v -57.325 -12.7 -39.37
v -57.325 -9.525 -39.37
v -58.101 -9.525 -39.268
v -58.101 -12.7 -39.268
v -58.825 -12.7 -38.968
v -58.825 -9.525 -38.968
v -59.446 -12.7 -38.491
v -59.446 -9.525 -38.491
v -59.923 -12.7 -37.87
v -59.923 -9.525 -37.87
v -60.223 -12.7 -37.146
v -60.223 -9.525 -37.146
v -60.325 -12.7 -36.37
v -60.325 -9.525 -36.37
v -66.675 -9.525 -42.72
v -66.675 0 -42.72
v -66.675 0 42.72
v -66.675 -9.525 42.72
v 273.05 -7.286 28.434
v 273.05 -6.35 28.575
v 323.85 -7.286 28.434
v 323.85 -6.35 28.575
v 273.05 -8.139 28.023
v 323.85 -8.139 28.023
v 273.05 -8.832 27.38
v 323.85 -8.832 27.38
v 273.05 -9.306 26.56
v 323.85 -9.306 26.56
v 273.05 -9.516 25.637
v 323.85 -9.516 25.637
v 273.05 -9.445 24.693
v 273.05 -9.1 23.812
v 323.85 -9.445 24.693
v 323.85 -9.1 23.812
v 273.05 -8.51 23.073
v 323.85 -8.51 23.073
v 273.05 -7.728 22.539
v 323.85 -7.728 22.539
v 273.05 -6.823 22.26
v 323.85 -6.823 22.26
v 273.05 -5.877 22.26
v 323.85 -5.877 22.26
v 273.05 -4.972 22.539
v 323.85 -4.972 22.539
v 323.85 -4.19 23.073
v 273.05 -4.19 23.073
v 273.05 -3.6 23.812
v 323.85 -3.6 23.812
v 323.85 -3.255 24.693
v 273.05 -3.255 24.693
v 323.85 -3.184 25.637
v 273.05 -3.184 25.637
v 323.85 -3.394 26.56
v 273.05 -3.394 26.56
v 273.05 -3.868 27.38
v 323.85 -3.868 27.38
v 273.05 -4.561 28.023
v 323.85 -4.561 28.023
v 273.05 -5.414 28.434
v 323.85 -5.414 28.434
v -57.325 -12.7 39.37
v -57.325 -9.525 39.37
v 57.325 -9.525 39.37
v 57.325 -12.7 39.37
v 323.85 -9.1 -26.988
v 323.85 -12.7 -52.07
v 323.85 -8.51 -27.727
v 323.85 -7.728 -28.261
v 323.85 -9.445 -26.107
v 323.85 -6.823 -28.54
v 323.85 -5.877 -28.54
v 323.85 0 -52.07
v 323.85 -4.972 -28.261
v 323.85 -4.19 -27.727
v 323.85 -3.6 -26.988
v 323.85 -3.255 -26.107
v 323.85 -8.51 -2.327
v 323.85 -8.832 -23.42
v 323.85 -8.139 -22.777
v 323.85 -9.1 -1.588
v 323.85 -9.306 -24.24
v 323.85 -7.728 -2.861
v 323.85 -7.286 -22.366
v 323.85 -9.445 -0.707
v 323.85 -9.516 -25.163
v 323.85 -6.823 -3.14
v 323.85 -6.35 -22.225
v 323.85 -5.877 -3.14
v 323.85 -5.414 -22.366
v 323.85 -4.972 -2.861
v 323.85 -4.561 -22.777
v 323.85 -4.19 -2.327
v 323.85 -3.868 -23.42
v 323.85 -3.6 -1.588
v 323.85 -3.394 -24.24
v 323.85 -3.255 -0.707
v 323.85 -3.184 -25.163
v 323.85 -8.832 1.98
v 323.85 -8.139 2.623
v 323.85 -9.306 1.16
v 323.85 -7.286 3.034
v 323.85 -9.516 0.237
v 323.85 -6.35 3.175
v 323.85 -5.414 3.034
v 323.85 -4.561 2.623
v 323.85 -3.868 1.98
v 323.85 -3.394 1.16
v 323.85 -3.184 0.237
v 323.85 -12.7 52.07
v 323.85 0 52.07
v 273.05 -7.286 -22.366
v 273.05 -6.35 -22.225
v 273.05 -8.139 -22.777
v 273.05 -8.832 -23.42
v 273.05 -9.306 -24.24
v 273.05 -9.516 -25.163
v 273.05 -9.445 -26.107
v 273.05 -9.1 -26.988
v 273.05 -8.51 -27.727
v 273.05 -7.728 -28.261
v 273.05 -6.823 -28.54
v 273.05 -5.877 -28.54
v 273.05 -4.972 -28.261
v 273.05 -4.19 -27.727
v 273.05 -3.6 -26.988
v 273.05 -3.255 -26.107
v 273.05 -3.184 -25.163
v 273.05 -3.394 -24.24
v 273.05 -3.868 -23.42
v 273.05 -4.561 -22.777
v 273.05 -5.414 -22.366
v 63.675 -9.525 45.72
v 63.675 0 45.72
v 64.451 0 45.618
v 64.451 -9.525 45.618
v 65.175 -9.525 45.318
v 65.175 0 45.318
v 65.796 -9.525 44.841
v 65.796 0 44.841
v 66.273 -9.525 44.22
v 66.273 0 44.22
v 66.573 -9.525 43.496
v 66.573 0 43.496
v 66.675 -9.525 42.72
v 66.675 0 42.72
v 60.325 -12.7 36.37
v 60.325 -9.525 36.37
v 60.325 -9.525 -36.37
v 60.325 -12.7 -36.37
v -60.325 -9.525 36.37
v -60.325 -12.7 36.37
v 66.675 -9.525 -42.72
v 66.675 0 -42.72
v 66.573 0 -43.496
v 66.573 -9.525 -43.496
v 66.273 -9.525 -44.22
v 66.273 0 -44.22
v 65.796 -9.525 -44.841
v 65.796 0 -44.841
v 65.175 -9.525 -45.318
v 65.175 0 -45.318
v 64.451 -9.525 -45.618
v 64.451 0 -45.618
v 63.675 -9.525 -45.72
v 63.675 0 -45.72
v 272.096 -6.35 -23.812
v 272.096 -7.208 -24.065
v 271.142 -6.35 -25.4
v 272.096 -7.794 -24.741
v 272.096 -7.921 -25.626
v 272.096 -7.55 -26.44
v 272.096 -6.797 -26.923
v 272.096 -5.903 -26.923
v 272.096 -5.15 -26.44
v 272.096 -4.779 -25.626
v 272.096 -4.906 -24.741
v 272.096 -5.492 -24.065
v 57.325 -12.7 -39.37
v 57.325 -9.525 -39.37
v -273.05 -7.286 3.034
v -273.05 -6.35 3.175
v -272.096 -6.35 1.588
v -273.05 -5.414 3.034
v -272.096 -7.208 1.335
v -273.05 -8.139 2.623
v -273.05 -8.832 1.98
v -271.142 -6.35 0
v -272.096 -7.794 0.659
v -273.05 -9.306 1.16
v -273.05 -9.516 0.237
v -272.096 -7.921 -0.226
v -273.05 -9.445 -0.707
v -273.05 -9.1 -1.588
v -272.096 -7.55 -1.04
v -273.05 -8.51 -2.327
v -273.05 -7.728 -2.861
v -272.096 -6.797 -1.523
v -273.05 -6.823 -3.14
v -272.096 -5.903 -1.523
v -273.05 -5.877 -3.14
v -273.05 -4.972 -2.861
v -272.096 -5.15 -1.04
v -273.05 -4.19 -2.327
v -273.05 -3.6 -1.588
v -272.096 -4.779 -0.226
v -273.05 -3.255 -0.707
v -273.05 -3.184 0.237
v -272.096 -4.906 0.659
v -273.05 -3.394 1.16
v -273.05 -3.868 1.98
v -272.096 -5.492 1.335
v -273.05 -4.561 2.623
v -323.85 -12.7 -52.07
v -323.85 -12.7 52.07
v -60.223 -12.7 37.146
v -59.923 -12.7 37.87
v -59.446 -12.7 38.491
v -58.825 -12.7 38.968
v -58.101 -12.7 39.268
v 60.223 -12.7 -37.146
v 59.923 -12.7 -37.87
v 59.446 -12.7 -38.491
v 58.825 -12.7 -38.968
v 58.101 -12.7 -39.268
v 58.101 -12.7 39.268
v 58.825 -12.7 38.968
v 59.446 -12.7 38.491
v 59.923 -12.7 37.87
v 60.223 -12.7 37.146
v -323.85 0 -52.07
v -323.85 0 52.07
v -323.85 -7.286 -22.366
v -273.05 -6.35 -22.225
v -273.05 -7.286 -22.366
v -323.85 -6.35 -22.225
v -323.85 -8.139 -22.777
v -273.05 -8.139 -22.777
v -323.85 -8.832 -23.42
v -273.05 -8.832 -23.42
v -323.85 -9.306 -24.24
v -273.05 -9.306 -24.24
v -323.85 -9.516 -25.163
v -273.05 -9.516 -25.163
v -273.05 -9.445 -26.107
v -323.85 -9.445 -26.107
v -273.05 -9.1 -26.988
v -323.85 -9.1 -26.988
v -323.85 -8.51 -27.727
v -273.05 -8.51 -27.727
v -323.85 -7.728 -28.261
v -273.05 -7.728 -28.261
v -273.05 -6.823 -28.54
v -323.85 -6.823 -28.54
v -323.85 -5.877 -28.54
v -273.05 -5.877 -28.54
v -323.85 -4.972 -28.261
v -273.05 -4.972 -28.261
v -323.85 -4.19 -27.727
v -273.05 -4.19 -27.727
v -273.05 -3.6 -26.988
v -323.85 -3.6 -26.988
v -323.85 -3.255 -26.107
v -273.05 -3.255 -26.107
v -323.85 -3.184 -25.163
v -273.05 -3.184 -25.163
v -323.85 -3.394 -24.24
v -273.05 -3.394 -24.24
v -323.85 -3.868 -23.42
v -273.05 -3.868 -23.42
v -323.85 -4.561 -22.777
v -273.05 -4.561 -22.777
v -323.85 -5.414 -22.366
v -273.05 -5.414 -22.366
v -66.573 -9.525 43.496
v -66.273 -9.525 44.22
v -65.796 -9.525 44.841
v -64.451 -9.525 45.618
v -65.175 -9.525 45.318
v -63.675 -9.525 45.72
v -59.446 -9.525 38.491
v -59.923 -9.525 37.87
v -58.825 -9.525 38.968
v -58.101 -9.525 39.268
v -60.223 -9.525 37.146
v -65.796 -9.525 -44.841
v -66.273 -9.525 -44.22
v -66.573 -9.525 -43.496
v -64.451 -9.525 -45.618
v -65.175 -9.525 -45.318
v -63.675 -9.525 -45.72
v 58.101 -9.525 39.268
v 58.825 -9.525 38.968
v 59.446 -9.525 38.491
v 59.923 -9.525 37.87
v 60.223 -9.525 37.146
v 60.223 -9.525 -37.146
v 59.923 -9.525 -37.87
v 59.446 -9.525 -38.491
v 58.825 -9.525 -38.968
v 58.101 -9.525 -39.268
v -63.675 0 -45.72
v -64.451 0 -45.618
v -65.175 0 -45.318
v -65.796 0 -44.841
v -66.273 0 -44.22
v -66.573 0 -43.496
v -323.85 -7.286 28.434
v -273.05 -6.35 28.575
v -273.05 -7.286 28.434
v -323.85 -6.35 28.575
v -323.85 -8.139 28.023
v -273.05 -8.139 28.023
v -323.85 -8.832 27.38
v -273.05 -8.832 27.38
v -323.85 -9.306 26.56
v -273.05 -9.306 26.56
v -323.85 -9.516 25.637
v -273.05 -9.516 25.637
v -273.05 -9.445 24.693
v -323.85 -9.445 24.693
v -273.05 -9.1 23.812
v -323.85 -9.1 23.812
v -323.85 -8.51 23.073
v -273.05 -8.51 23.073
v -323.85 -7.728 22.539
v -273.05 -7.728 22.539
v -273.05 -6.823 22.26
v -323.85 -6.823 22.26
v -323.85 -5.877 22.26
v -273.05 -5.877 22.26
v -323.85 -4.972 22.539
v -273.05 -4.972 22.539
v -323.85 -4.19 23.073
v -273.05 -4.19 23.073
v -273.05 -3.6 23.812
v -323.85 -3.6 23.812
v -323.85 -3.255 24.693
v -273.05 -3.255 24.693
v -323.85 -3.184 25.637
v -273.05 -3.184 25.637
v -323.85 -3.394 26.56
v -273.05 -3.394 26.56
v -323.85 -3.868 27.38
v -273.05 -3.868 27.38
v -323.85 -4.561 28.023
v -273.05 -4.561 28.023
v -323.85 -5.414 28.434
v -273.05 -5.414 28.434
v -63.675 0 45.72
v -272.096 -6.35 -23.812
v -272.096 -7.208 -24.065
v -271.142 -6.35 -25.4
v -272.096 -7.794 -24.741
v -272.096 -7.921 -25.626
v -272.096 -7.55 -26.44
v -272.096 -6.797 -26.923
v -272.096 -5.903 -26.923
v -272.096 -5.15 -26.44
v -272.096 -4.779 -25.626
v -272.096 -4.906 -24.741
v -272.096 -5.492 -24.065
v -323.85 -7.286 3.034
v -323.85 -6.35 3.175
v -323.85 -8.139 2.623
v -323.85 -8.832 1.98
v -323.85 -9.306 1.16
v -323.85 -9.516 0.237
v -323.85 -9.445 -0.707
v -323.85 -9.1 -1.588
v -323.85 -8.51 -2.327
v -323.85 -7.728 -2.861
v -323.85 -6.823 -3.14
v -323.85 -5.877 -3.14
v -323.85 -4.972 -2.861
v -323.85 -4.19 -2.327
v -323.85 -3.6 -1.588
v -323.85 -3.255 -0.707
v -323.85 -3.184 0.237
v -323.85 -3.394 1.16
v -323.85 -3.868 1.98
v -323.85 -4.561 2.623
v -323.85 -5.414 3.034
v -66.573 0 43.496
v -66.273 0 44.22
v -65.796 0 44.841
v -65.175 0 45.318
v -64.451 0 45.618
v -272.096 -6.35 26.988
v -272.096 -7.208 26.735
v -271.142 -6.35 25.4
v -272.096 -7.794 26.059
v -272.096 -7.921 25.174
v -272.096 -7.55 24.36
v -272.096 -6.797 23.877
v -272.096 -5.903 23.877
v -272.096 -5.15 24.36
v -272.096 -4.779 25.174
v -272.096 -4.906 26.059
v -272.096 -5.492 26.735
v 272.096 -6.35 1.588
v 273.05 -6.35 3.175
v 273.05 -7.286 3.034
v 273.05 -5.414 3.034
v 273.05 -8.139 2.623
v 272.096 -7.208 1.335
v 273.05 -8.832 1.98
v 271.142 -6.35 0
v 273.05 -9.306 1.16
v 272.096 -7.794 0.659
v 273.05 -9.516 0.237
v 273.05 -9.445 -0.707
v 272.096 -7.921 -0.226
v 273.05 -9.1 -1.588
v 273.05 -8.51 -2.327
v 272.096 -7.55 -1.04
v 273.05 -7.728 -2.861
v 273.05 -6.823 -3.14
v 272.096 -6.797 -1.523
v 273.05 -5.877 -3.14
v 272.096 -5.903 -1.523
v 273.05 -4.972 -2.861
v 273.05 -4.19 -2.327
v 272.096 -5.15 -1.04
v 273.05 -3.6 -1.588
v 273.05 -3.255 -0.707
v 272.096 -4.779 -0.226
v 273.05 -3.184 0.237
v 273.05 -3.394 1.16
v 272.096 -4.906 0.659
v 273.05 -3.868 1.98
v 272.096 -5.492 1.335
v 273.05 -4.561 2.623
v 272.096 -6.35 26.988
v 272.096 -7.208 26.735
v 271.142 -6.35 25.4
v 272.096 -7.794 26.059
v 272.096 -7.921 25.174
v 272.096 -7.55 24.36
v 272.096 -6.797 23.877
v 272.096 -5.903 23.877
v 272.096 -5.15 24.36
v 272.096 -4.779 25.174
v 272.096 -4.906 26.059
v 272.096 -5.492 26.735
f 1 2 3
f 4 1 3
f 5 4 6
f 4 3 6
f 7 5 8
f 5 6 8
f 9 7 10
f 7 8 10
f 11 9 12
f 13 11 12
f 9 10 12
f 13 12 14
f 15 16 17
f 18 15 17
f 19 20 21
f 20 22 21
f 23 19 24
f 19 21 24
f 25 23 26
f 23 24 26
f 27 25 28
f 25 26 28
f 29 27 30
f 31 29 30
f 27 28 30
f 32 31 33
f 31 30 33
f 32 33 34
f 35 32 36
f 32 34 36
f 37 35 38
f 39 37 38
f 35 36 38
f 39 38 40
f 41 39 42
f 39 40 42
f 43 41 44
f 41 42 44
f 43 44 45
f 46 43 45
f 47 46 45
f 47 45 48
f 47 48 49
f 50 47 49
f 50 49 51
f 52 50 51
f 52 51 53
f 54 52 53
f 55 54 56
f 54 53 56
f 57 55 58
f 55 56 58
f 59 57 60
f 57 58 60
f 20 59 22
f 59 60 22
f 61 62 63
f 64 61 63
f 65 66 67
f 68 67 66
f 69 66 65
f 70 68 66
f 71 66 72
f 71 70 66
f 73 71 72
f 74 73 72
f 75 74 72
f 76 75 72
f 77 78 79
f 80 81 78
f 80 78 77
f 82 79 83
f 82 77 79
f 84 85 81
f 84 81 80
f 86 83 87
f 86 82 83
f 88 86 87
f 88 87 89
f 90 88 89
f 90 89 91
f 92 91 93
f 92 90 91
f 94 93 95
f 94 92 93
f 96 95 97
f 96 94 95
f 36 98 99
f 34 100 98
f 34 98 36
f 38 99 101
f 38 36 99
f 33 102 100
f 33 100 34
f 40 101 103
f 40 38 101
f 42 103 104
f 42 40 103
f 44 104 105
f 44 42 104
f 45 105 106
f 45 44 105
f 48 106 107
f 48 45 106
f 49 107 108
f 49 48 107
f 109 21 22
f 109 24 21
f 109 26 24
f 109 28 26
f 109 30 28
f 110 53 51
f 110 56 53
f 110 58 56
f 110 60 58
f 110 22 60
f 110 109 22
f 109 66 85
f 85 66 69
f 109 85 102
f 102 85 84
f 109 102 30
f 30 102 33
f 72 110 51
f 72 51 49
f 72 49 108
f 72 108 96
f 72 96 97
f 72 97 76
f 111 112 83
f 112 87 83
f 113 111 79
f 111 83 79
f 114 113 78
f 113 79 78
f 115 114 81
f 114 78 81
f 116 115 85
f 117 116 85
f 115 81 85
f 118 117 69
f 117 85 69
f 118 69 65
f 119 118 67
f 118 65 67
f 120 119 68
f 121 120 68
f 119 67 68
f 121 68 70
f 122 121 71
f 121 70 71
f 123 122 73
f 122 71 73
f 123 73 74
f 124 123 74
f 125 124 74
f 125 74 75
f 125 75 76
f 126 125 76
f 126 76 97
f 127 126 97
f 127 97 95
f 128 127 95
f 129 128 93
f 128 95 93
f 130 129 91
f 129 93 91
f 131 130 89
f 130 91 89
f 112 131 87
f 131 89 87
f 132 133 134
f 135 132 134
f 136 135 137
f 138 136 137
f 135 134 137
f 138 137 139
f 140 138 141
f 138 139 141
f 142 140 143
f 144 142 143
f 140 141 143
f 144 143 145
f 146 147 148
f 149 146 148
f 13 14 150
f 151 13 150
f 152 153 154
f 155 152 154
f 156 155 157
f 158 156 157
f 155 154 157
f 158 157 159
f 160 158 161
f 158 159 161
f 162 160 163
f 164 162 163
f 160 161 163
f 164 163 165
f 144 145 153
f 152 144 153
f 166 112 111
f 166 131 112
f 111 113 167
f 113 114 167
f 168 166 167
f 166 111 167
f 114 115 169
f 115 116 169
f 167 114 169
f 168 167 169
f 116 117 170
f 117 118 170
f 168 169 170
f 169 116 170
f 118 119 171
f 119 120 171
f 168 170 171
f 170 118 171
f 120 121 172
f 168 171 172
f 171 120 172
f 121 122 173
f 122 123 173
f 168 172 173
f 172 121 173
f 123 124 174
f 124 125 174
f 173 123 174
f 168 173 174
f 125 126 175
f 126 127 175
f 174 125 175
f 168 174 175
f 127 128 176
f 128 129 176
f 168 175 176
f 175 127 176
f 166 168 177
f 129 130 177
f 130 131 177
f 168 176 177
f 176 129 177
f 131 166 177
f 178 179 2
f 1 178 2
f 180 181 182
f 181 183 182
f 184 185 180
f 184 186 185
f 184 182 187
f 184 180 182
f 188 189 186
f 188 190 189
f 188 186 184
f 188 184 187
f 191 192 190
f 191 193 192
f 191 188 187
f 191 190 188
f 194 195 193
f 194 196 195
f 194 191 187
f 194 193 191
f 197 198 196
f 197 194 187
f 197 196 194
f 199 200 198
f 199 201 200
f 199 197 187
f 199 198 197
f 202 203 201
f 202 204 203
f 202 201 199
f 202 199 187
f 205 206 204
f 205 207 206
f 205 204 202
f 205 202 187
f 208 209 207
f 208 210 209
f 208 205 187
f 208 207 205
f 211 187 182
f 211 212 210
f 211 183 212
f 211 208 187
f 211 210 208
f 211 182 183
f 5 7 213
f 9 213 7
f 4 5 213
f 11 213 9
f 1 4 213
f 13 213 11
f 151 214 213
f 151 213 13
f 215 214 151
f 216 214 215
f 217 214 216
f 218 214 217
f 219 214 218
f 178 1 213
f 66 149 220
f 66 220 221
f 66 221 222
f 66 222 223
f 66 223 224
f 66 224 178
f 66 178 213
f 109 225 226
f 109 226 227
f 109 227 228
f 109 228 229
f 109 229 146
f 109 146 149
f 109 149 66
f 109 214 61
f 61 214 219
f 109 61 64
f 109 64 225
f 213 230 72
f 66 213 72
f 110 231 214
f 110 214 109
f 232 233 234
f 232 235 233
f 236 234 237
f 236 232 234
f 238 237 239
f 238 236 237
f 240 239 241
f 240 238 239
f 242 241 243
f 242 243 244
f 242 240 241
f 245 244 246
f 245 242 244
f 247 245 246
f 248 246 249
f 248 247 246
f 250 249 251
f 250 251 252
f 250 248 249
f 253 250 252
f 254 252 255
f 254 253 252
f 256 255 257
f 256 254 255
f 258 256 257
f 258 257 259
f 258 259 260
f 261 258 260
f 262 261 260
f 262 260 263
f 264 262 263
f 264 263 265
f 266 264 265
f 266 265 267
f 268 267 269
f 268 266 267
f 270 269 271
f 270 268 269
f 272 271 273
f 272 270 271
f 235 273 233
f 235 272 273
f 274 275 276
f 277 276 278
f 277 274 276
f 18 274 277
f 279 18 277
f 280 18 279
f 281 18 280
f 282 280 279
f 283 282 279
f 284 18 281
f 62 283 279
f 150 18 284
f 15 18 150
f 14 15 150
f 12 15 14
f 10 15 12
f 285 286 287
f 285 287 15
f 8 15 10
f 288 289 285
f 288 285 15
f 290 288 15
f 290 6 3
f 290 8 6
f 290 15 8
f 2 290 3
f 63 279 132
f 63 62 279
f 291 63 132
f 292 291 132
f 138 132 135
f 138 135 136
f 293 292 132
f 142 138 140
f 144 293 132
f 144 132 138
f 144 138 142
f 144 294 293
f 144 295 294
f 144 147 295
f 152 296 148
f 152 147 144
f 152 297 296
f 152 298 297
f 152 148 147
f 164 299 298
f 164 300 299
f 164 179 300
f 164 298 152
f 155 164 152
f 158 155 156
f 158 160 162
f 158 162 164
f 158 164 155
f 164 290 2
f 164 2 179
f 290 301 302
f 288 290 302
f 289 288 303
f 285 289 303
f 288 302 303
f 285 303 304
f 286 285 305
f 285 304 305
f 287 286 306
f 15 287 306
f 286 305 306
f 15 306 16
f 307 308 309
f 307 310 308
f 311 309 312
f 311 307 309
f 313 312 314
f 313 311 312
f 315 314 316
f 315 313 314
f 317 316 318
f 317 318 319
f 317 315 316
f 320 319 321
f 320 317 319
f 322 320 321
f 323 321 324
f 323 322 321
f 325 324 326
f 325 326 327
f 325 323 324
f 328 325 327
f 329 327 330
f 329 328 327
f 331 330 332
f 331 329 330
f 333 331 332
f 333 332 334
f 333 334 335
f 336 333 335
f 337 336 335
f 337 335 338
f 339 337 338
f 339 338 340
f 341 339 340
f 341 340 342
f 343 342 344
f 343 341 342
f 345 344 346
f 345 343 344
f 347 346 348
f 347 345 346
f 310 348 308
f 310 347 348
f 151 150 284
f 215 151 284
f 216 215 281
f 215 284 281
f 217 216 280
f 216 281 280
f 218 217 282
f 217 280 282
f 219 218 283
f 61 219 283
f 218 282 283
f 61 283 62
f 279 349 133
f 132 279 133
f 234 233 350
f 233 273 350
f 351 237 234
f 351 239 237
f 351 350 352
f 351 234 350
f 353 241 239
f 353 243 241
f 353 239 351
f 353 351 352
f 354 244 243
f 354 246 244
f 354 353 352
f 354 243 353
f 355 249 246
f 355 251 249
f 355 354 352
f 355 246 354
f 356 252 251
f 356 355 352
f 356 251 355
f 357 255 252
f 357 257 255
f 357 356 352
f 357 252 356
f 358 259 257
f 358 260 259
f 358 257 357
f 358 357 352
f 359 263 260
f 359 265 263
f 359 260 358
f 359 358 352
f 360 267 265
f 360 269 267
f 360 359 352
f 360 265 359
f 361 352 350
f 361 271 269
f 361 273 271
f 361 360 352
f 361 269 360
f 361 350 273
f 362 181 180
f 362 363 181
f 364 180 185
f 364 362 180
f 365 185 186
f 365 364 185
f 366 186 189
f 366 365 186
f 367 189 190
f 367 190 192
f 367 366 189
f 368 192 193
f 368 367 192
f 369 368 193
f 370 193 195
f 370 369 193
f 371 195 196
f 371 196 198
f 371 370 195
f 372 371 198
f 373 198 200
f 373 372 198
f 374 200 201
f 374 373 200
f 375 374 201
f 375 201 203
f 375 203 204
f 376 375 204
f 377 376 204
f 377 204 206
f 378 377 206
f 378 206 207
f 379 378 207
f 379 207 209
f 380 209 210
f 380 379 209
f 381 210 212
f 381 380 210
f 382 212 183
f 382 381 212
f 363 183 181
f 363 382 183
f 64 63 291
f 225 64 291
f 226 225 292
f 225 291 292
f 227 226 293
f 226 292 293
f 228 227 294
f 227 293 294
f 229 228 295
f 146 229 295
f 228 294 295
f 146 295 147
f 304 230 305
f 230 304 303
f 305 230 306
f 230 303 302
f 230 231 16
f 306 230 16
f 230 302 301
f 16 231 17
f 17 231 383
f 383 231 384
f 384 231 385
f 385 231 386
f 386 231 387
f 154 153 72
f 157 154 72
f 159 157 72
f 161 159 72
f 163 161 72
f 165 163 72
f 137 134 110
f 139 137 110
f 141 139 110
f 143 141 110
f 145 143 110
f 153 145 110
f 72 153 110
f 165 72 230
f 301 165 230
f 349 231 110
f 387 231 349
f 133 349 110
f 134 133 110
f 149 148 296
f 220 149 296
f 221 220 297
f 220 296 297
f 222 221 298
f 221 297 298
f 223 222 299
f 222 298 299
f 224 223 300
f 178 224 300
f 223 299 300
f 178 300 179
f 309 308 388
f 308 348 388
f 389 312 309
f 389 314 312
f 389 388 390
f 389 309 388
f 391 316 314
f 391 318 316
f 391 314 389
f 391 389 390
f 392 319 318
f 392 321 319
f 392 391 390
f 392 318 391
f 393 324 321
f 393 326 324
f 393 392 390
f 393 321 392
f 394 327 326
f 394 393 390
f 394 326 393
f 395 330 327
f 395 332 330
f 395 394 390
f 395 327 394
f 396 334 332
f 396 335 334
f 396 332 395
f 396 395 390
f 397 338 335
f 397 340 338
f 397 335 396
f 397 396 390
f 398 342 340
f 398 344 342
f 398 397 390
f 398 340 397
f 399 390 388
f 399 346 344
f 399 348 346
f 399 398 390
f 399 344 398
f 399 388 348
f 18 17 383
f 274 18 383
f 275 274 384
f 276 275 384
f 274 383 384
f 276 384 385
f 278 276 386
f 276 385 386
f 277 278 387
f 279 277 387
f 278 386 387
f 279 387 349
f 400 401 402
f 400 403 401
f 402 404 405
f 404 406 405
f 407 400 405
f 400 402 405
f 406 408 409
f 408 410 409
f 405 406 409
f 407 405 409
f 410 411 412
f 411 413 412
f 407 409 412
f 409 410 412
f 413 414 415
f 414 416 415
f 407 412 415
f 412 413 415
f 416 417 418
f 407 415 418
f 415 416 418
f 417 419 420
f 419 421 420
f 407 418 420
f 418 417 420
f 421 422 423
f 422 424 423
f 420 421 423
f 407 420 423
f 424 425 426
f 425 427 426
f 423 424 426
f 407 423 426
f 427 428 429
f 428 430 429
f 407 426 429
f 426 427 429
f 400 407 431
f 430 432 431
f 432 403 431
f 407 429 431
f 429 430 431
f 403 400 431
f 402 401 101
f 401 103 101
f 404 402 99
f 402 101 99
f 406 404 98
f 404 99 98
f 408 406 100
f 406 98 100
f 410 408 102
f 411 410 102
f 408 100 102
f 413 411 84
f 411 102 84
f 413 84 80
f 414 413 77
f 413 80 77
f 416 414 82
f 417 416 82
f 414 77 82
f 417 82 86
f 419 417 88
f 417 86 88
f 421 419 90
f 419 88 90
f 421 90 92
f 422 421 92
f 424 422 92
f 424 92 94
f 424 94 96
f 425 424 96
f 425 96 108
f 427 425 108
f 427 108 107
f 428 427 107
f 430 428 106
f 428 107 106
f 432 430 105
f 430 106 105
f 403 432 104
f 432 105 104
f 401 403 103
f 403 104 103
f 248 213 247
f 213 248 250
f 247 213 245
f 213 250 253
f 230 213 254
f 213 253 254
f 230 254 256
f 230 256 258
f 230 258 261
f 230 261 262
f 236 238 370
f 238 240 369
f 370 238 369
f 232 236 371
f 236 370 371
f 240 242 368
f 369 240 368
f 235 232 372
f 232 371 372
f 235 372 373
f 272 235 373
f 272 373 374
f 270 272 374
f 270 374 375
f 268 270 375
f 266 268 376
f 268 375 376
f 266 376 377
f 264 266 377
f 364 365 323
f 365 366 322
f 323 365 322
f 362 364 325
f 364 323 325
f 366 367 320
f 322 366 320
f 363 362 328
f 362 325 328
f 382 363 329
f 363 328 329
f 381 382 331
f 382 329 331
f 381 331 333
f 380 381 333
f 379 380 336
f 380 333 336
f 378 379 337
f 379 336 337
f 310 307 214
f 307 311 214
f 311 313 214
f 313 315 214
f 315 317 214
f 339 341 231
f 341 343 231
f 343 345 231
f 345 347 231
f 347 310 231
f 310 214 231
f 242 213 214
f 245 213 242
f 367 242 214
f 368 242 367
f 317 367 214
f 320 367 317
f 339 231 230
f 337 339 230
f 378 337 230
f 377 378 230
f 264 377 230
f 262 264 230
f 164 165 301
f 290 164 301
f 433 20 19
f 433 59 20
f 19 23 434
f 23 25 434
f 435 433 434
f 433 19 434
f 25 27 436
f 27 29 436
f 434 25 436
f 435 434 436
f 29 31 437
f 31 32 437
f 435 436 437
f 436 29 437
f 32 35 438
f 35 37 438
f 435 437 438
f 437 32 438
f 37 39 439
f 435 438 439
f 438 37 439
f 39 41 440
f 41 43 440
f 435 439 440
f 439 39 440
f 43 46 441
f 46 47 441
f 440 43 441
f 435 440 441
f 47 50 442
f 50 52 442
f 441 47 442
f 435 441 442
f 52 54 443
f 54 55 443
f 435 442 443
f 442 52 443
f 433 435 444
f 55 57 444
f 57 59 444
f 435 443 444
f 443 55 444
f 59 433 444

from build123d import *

# Parameters (mm, degrees)
SKETCH2_W                         = 647.7
SKETCH2_H                         = 12.7
BOSS_EXTRUDE1_DEPTH               = 52.07
CUT_EXTRUDE1_DEPTH                = 9.525
F_1_4_20_THREADED_HOLE_AT_2_COUNT = 2
F_1_4_20_THREADED_HOLE_AT_2_PITCH = 25.4
F_1_4_20_THREADED_HOLE_AT_3_COUNT = 2
F_1_4_20_THREADED_HOLE_AT_3_PITCH = 50.8
CUT_EXTRUDE2_DEPTH                = 329.255079778


with BuildPart() as part:
    # Sketch2 → Boss-Extrude1 (new, symmetric)
    with BuildSketch(Plane.XY):
        with Locations((0, -6.35)):
            Rectangle(SKETCH2_W, SKETCH2_H)
    extrude(amount=BOSS_EXTRUDE1_DEPTH, both=True)

    # Sketch3 → Cut-Extrude1 (cut)
    with BuildSketch(Plane(origin=(0, 0, 0), x_dir=(1, 0, 0), z_dir=(0, 1, 0))):
        with BuildLine():
            Line((63.675, 45.72), (-63.675, 45.72))
            ThreePointArc((-63.675, 45.72), (-65.796320344, 44.841320344), (-66.675, 42.72))
            Line((-66.675, 42.72), (-66.675, -42.72))
            ThreePointArc((-66.675, -42.72), (-65.796320344, -44.841320344), (-63.675, -45.72))
            Line((-63.675, -45.72), (63.675, -45.72))
            ThreePointArc((63.675, -45.72), (65.796320344, -44.841320344), (66.675, -42.72))
            Line((66.675, -42.72), (66.675, 42.72))
            ThreePointArc((66.675, 42.72), (65.796320344, 44.841320344), (63.675, 45.72))
        make_face()
    extrude(amount=-CUT_EXTRUDE1_DEPTH, mode=Mode.SUBTRACT)

    # Sketch6 → 1/4"-20 threaded hole (revolve, cut)
    with BuildSketch(Plane(origin=(-323.85, -6.35, -25.4), x_dir=(0, 0, 1), z_dir=(0, 1, 0))):
        Polygon((0, 0), (0, 52.707732465), (3.175, 50.8), (3.175, 0), align=None)
    f_1_4_20_threaded_hole = revolve(axis=Axis((-330.2, -6.35, -25.4), (1, 0, 0)), mode=Mode.SUBTRACT)

    # 1/4"-20 threaded hole at 2: 1/4"-20 threaded hole ×2
    with Locations(*[(0, 0, i * F_1_4_20_THREADED_HOLE_AT_2_PITCH) for i in range(1, F_1_4_20_THREADED_HOLE_AT_2_COUNT)]):
        add(f_1_4_20_threaded_hole, mode=Mode.SUBTRACT)

    # 1/4"-20 threaded hole at 3: 1/4"-20 threaded hole ×2
    with Locations(*[(0, 0, i * F_1_4_20_THREADED_HOLE_AT_3_PITCH) for i in range(1, F_1_4_20_THREADED_HOLE_AT_3_COUNT)]):
        add(f_1_4_20_threaded_hole, mode=Mode.SUBTRACT)

    # Mirror1: 1/4"-20 threaded hole across plane
    add(f_1_4_20_threaded_hole.mirror(Plane(origin=(0, 0, 0), x_dir=(0, 0, 1), z_dir=(1, 0, 0))), mode=Mode.SUBTRACT)

    # Mirror1 copy 1 sketch → Mirror1 copy 1 (revolve, cut)
    with BuildSketch(Plane(origin=(323.85, -6.35, 0), x_dir=(0, 0, 1), z_dir=(0, 1, 0))):
        Polygon((0, 0), (0, -52.707732465), (3.175, -50.8), (3.175, 0), align=None)
    revolve(axis=Axis((330.2, -6.35, 0), (1, 0, 0)), mode=Mode.SUBTRACT)

    # Mirror1 copy 2 sketch → Mirror1 copy 2 (revolve, cut)
    with BuildSketch(Plane(origin=(323.85, -6.35, 25.4), x_dir=(0, 0, 1), z_dir=(0, 1, 0))):
        Polygon((0, 0), (0, -52.707732465), (3.175, -50.8), (3.175, 0), align=None)
    revolve(axis=Axis((330.2, -6.35, 25.4), (1, 0, 0)), mode=Mode.SUBTRACT)

    # Sketch3<3> → Cut-Extrude2 (cut, through all)
    with BuildSketch(Plane(origin=(0, 0, 0), x_dir=(1, 0, 0), z_dir=(0, 1, 0))):
        with BuildLine():
            Line((57.325, 39.37), (-57.325, 39.37))
            ThreePointArc((-57.325, 39.37), (-59.446320344, 38.491320344), (-60.325, 36.37))
            Line((-60.325, 36.37), (-60.325, -36.37))
            ThreePointArc((-60.325, -36.37), (-59.446320344, -38.491320344), (-57.325, -39.37))
            Line((-57.325, -39.37), (57.325, -39.37))
            ThreePointArc((57.325, -39.37), (59.446320344, -38.491320344), (60.325, -36.37))
            Line((60.325, -36.37), (60.325, 36.37))
            ThreePointArc((60.325, 36.37), (59.446320344, 38.491320344), (57.325, 39.37))
        make_face()
    extrude(amount=-CUT_EXTRUDE2_DEPTH, mode=Mode.SUBTRACT)


solid = part.part
